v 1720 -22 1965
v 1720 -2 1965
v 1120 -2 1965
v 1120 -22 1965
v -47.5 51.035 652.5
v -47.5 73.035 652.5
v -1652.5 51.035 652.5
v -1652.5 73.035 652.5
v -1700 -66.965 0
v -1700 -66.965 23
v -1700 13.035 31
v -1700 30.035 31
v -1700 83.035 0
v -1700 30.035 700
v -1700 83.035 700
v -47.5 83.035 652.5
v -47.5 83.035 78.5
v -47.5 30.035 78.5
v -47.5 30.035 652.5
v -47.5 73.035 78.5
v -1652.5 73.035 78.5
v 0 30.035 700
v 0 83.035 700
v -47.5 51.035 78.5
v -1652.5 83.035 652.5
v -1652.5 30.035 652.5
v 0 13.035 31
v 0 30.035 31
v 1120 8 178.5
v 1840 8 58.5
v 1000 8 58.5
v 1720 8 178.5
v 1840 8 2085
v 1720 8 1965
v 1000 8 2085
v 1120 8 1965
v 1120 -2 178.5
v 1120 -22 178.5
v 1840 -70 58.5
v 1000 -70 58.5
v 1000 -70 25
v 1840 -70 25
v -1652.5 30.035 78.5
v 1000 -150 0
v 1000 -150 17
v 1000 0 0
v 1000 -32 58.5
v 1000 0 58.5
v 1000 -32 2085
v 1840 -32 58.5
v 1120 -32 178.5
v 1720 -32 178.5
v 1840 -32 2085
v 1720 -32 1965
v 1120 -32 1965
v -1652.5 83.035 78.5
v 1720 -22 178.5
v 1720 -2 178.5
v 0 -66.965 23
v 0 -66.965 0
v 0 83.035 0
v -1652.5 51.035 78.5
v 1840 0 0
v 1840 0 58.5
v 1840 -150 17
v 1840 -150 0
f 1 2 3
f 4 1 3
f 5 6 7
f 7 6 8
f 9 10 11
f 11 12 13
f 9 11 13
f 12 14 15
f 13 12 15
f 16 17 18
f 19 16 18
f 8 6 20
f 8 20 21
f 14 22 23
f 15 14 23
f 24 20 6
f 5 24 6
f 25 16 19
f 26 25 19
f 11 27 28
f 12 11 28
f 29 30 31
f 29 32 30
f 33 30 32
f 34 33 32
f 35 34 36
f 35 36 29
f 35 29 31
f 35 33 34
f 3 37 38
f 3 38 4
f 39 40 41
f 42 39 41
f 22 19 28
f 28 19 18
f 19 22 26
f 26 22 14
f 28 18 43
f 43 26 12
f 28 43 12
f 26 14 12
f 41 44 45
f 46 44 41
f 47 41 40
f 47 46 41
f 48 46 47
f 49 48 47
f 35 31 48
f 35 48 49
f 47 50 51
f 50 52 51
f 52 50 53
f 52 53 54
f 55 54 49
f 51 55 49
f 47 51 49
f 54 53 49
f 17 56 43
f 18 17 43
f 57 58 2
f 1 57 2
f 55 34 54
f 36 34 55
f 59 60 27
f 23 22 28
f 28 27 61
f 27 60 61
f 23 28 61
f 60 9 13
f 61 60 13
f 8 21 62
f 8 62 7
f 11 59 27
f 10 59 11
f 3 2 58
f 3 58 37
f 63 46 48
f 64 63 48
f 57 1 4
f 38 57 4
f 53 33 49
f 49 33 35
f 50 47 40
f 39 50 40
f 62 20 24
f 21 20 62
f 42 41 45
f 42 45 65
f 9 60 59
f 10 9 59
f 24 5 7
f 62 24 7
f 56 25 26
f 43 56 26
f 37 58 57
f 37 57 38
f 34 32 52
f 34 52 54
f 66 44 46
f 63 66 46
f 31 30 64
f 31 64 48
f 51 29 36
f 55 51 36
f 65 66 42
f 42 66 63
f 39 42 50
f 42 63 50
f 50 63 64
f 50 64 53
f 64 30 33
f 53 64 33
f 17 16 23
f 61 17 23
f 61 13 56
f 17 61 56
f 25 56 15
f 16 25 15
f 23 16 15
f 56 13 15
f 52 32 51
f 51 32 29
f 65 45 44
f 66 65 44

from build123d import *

# Parameters (mm, degrees)
F0_W      = 150
F0_H      = 31
F1_DEPTH  = 1700
F3_W      = 53
F3_H      = 47.5
F6_W      = 1605
F6_H      = 574
F7_DEPTH  = 22
F10_DEPTH = 840
F12_W     = 840
F12_H     = 2026.5
F12_W_2   = 600
F12_H_2   = 1786.5
F13_DEPTH = 40
F15_W     = 600
F15_H     = 1786.5
F16_DEPTH = 20
F17_SIZE2 = 8
F17_SIZE  = 80
F18_SIZE2 = 79.99999
F18_SIZE  = 7.99999


# Not quite as in the source:
# - a fillet or chamfer is up to 0.001 mm smaller than in the source, because OpenCascade refuses the exact size


with BuildPart() as f1:
    # F0 (on Right) → F1 (new body)
    with BuildSketch(Plane.YZ):
        with Locations((8.0352395773, 15.5)):
            Rectangle(F0_W, F0_H)
    extrude(amount=-F1_DEPTH)

    # F4: sweep along a path in F2
    with BuildLine(Plane(origin=(0, 83.0352395773, 0), x_dir=(-1, 0, 0), z_dir=(0, 1, 0))) as f4_path:
        Line((0, 31), (1700, 31))
        Line((1700, 31), (1700, 700))
        Line((1700, 700), (0, 700))
        Line((0, 700), (0, 31))
    # F3 (on Right) → F4 (sweep)
    with BuildSketch(Plane.YZ):
        with Locations((56.5352395773, 54.75)):
            Rectangle(F3_W, F3_H)
    sweep(path=f4_path.line, transition=Transition.RIGHT)

    # F17
    f17_edges = [f1.edges().sort_by_distance(p)[0] for p in [
        (-850, -66.96476, 31),
    ]]
    f17_side = f1.faces().sort_by_distance((-850, -18.46476, 31))[0]
    chamfer(f17_edges, length=F17_SIZE, length2=F17_SIZE2, reference=f17_side)


with BuildPart() as f7:
    # F6 (on offset) → F7 (new body)
    with BuildSketch(Plane(origin=(0, 73.0352395773, 0), x_dir=(-1, 0, 0), z_dir=(0, 1, 0))):
        with Locations((850, 365.5)):
            Rectangle(F6_W, F6_H)
    extrude(amount=-F7_DEPTH)


with BuildPart() as f10:
    # F9 (on offset) → F10 (new body)
    with BuildSketch(Plane.YZ.offset(1000)):
        Polygon((-150, 0), (0, 0), (0, 25), (0, 58.5), (-70, 58.5), (-70, 25), (-150, 25), align=None)
    extrude(amount=F10_DEPTH)

    # F12 (on offset) → F13 (join)
    with BuildSketch(Plane(origin=(0, 8, 0), x_dir=(-1, 0, 0), z_dir=(0, 1, 0))):
        with Locations((-1420, 1071.75)):
            Rectangle(F12_W, F12_H)
        with Locations((-1420, 1071.75)):
            Rectangle(F12_W_2, F12_H_2, mode=Mode.SUBTRACT)
    extrude(amount=-F13_DEPTH)

    # F18 (size 8 and 80 in the source; OpenCascade refuses exactly that, so slightly less here)
    f18_edges = [f10.edges().sort_by_distance(p)[0] for p in [
        (1420, -150, 25),
    ]]
    f18_side = f10.faces().sort_by_distance((1420, -150, 12.5))[0]
    chamfer(f18_edges, length=F18_SIZE, length2=F18_SIZE2, reference=f18_side)


with BuildPart() as f16:
    # F15 (on offset) → F16 (new body)
    with BuildSketch(Plane(origin=(0, -2, 0), x_dir=(-1, 0, 0), z_dir=(0, 1, 0))):
        with Locations((-1420, 1071.75)):
            Rectangle(F15_W, F15_H)
    extrude(amount=-F16_DEPTH)


solid = Compound([f1.part, f7.part, f10.part, f16.part])
